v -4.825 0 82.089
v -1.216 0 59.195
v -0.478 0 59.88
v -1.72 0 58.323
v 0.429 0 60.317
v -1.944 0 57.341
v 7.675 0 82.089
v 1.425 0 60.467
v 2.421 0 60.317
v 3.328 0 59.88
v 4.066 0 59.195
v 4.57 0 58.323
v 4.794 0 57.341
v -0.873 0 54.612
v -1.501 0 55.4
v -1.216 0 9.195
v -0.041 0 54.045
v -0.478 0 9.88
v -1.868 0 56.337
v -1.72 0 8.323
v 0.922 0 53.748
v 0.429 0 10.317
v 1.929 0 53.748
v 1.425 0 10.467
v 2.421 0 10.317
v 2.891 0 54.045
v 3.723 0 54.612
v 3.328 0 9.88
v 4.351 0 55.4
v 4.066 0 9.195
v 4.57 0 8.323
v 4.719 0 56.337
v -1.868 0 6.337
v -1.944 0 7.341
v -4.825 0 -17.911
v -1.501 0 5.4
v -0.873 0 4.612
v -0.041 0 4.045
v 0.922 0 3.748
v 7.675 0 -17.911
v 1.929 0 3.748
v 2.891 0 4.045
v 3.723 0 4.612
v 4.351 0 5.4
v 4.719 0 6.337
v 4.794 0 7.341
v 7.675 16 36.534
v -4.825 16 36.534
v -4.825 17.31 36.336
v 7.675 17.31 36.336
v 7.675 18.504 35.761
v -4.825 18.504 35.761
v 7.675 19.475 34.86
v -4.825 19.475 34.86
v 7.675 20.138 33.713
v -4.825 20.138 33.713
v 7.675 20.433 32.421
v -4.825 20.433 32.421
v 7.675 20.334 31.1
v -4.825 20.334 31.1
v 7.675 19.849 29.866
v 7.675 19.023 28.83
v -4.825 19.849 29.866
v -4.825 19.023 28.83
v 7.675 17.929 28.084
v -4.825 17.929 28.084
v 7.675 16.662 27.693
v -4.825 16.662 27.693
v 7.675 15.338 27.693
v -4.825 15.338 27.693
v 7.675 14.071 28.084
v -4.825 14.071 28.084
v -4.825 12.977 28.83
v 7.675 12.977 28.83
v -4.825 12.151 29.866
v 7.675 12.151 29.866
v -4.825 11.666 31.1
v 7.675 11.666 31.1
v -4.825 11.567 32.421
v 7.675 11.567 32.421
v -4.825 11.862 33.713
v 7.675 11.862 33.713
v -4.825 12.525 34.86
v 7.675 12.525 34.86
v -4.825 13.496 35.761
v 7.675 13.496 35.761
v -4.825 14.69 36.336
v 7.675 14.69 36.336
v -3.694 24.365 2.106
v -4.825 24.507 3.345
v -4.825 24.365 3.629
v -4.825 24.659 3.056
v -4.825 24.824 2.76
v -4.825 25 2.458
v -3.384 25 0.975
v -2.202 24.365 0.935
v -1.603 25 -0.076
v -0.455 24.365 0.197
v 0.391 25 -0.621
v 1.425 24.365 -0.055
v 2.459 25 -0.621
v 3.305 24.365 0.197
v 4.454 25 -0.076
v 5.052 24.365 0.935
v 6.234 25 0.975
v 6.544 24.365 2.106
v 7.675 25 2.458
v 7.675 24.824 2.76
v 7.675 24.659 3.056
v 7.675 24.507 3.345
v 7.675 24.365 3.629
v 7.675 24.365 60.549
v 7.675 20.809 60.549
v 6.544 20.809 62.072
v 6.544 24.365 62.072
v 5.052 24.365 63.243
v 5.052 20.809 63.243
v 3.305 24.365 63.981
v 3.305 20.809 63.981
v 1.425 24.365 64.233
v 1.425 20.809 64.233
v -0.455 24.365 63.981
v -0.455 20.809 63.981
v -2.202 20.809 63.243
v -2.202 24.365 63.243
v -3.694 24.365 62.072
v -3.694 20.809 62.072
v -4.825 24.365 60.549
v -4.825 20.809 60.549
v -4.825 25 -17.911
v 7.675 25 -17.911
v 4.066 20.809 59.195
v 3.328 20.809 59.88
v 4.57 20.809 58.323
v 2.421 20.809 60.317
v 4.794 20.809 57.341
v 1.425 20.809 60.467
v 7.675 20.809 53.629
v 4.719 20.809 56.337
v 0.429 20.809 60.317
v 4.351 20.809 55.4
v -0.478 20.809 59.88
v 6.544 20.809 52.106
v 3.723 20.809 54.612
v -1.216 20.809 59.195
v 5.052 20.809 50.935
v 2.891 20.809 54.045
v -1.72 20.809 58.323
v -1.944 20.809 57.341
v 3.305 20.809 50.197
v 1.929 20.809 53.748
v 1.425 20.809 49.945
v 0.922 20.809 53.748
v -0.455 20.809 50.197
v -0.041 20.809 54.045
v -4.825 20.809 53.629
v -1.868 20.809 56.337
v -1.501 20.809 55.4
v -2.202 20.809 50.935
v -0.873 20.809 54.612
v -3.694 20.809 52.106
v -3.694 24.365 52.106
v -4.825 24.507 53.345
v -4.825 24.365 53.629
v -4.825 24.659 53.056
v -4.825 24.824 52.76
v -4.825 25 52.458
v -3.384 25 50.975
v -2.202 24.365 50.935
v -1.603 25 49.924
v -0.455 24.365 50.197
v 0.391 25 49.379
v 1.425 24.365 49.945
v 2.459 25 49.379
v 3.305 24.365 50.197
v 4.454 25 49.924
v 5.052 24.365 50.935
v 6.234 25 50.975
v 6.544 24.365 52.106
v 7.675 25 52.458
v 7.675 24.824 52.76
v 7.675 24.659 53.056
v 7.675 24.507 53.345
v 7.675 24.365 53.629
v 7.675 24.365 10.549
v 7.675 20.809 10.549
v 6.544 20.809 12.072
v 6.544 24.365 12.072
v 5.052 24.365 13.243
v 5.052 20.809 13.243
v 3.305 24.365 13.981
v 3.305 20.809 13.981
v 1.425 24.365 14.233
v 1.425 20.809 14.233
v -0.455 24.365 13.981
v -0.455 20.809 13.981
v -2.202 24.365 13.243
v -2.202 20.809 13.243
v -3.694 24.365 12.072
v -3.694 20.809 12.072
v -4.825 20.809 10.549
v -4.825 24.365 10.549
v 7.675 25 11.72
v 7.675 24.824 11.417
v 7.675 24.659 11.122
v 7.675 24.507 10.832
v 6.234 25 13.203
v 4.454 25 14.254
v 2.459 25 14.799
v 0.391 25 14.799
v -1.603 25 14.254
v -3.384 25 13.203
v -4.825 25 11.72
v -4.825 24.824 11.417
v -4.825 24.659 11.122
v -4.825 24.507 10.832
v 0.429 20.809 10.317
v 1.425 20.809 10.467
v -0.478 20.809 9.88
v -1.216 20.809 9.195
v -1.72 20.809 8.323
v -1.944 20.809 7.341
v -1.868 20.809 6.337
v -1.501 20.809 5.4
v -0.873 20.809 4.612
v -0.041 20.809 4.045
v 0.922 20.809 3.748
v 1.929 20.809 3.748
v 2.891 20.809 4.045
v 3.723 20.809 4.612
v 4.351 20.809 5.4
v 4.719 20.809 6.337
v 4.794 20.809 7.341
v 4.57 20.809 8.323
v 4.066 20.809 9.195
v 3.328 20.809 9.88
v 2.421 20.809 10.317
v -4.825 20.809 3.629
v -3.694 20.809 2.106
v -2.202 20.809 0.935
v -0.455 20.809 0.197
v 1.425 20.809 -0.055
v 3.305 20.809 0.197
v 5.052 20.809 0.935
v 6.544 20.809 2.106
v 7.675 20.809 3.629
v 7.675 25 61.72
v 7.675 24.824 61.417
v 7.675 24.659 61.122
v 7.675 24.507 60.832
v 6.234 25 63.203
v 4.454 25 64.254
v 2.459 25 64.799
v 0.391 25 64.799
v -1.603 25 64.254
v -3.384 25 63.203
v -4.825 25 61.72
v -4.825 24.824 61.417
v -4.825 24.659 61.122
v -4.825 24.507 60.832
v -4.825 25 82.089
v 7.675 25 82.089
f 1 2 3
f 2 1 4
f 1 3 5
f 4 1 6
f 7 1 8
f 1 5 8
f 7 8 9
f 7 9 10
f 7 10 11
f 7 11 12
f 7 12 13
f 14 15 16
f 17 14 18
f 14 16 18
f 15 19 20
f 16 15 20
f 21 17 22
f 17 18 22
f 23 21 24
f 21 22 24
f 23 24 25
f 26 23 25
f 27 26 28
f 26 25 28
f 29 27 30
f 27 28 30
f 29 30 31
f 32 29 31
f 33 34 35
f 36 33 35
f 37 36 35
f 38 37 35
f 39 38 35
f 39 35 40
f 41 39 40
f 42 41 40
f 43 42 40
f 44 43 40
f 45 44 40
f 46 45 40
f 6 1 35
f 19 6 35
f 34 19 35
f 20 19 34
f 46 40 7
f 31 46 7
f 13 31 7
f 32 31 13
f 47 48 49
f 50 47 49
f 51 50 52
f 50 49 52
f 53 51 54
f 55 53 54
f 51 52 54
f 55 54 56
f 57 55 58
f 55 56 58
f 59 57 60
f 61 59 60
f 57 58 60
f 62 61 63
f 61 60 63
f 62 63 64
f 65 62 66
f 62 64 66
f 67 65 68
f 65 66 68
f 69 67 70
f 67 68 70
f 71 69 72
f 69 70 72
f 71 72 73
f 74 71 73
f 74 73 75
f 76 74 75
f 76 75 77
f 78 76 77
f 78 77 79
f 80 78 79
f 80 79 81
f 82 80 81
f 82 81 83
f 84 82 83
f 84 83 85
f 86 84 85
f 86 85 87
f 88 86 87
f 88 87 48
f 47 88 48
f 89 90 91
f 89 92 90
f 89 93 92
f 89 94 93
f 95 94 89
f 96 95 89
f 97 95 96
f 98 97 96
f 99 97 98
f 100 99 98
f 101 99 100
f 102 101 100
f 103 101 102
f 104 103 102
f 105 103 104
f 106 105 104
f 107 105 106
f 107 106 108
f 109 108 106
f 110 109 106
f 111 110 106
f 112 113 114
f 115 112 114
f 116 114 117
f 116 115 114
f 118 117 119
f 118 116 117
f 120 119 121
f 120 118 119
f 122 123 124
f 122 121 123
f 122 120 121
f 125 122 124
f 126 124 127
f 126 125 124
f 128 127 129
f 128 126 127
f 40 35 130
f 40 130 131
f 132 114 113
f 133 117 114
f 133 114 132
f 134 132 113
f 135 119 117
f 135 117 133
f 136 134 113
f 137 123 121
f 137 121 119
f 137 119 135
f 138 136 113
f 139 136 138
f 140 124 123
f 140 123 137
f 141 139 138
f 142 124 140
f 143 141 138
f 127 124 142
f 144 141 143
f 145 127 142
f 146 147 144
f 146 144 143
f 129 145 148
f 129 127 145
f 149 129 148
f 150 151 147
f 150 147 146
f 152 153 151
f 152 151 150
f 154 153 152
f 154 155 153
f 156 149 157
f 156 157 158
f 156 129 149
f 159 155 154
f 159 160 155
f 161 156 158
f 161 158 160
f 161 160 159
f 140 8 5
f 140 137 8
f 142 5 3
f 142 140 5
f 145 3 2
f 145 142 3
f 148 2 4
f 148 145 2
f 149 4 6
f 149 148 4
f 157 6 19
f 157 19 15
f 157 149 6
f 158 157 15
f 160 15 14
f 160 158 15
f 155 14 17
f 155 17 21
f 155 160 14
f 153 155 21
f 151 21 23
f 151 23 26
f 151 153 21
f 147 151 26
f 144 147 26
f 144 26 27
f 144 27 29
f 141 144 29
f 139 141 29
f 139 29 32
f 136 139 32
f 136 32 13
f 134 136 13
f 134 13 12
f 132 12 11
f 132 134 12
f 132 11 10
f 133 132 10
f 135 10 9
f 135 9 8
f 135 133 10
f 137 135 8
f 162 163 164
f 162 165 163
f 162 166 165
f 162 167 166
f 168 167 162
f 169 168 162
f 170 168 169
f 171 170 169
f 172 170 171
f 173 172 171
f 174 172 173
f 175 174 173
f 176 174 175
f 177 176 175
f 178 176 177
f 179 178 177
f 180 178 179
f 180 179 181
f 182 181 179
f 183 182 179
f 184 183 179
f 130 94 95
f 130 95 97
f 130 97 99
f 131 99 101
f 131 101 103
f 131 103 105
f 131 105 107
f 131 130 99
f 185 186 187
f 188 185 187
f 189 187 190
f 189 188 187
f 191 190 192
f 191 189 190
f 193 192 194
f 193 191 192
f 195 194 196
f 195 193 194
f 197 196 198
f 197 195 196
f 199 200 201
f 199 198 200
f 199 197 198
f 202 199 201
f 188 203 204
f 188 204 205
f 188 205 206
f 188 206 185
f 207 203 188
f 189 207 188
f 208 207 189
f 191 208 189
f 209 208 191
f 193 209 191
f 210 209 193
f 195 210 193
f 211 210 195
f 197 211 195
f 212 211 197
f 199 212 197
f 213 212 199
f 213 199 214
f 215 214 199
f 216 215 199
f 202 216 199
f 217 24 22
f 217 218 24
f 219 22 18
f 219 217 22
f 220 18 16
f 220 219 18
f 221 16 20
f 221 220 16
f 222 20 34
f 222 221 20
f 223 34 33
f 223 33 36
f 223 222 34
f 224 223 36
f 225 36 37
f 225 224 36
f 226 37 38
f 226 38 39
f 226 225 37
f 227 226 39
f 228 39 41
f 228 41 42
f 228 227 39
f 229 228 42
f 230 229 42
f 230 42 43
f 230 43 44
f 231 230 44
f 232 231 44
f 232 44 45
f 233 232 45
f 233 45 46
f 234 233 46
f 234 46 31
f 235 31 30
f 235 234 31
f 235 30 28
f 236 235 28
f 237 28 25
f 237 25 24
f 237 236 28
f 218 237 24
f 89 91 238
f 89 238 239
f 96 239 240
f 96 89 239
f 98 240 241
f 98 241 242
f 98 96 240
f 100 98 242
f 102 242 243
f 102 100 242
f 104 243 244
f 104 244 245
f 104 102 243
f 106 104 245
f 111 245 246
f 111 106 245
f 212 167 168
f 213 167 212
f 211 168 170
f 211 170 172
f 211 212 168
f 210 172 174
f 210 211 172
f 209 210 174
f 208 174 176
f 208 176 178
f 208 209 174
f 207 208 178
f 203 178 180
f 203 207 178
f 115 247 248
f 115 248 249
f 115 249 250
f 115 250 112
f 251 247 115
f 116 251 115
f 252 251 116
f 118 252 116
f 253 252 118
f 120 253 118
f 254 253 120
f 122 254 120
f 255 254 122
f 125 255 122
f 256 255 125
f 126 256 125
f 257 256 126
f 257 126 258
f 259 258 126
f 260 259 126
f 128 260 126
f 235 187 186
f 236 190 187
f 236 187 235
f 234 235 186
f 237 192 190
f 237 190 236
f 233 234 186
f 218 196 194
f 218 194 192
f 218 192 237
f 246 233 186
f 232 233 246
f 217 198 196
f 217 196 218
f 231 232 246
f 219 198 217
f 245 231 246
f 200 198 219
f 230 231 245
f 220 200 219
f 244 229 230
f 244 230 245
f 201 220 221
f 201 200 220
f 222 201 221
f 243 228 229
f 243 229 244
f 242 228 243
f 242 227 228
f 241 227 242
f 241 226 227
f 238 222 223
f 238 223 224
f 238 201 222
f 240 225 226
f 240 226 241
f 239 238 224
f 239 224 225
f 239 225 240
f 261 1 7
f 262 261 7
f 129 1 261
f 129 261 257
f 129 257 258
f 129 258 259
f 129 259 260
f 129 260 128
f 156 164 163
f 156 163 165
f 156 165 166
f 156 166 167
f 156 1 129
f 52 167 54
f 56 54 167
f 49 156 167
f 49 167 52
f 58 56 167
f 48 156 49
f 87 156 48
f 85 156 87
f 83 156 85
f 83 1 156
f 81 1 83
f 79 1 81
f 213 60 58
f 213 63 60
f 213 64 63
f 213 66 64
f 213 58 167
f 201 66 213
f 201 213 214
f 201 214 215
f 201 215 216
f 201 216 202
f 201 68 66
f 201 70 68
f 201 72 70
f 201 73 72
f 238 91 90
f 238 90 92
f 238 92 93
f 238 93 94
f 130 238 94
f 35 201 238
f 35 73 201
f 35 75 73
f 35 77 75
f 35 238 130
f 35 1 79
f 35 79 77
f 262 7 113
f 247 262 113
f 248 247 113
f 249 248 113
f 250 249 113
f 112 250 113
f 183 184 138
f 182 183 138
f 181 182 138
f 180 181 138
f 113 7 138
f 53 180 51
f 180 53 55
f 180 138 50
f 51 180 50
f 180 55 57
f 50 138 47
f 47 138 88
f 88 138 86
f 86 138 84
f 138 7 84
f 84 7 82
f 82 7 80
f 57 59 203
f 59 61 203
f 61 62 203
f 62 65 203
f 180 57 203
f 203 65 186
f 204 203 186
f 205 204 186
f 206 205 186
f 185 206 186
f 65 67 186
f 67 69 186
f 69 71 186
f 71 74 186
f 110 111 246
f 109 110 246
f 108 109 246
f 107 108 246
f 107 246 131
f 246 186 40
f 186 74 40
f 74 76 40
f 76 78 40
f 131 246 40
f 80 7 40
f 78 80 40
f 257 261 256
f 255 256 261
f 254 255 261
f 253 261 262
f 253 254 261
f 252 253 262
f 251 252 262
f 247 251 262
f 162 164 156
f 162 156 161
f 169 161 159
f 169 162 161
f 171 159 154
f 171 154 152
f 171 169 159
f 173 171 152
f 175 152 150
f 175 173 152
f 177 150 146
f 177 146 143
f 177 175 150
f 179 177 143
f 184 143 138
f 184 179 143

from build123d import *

# Parameters (mm, degrees)
SKETCH1_W                                    = 12.5
SKETCH1_H                                    = 100
BOSS_EXTRUDE1_DEPTH                          = 25
CBORE_FOR_1_4_BINDING_HEAD_MACHINE_S_2_COUNT = 2
CBORE_FOR_1_4_BINDING_HEAD_MACHINE_S_2_PITCH = 50
CUT_EXTRUDE1_REACH                           = 14.5
SKETCH4_R                                    = 4.445


with BuildPart() as part:
    # Sketch1 → Boss-Extrude1 (new body)
    with BuildSketch(Plane(origin=(0, 0, 0), x_dir=(1, 0, 0), z_dir=(0, 1, 0))):
        with Locations((1.425031038, -32.088839839)):
            Rectangle(SKETCH1_W, SKETCH1_H)
    extrude(amount=BOSS_EXTRUDE1_DEPTH)

    # Sketch3 → CBORE for 1/4 Binding Head Machine Screw1 (revolve, cut)
    with BuildSketch(Plane(origin=(1.425031038, 25, 7.088839839), x_dir=(0, 0, 1), z_dir=(1, 0, 0))):
        Polygon((0, 0), (0, 25), (3.3782, 25), (3.3782, 4.191), (7.14375, 4.191), (7.14375, 0.635), (7.77875, 0), align=None)
    cbore_for_1_4_binding_head_machine_screw = revolve(axis=Axis((1.425031038, 31.35, 7.088839839), (0, -1, 0)), mode=Mode.SUBTRACT)

    # CBORE for 1_4 Binding Head Machine S 2: CBORE for 1/4 Binding Head Machine Screw1 ×2
    with Locations(*[(0, 0, i * CBORE_FOR_1_4_BINDING_HEAD_MACHINE_S_2_PITCH) for i in range(1, CBORE_FOR_1_4_BINDING_HEAD_MACHINE_S_2_COUNT)]):
        add(cbore_for_1_4_binding_head_machine_screw, mode=Mode.SUBTRACT)

    # Sketch4 → Cut-Extrude1 (cut, up to next)
    with BuildSketch(Plane.ZY.offset(4.824968962), mode=Mode.PRIVATE) as cut_extrude1_sk1:
        with Locations((32.088839839, 16)):
            Circle(SKETCH4_R)
    cut_extrude1_tool1 = extrude(cut_extrude1_sk1.sketch, amount=-CUT_EXTRUDE1_REACH, mode=Mode.PRIVATE) & part.part
    add(cut_extrude1_tool1.solids().sort_by_distance((-4.824969, 16, 32.08884))[0], mode=Mode.SUBTRACT)


solid = part.part
